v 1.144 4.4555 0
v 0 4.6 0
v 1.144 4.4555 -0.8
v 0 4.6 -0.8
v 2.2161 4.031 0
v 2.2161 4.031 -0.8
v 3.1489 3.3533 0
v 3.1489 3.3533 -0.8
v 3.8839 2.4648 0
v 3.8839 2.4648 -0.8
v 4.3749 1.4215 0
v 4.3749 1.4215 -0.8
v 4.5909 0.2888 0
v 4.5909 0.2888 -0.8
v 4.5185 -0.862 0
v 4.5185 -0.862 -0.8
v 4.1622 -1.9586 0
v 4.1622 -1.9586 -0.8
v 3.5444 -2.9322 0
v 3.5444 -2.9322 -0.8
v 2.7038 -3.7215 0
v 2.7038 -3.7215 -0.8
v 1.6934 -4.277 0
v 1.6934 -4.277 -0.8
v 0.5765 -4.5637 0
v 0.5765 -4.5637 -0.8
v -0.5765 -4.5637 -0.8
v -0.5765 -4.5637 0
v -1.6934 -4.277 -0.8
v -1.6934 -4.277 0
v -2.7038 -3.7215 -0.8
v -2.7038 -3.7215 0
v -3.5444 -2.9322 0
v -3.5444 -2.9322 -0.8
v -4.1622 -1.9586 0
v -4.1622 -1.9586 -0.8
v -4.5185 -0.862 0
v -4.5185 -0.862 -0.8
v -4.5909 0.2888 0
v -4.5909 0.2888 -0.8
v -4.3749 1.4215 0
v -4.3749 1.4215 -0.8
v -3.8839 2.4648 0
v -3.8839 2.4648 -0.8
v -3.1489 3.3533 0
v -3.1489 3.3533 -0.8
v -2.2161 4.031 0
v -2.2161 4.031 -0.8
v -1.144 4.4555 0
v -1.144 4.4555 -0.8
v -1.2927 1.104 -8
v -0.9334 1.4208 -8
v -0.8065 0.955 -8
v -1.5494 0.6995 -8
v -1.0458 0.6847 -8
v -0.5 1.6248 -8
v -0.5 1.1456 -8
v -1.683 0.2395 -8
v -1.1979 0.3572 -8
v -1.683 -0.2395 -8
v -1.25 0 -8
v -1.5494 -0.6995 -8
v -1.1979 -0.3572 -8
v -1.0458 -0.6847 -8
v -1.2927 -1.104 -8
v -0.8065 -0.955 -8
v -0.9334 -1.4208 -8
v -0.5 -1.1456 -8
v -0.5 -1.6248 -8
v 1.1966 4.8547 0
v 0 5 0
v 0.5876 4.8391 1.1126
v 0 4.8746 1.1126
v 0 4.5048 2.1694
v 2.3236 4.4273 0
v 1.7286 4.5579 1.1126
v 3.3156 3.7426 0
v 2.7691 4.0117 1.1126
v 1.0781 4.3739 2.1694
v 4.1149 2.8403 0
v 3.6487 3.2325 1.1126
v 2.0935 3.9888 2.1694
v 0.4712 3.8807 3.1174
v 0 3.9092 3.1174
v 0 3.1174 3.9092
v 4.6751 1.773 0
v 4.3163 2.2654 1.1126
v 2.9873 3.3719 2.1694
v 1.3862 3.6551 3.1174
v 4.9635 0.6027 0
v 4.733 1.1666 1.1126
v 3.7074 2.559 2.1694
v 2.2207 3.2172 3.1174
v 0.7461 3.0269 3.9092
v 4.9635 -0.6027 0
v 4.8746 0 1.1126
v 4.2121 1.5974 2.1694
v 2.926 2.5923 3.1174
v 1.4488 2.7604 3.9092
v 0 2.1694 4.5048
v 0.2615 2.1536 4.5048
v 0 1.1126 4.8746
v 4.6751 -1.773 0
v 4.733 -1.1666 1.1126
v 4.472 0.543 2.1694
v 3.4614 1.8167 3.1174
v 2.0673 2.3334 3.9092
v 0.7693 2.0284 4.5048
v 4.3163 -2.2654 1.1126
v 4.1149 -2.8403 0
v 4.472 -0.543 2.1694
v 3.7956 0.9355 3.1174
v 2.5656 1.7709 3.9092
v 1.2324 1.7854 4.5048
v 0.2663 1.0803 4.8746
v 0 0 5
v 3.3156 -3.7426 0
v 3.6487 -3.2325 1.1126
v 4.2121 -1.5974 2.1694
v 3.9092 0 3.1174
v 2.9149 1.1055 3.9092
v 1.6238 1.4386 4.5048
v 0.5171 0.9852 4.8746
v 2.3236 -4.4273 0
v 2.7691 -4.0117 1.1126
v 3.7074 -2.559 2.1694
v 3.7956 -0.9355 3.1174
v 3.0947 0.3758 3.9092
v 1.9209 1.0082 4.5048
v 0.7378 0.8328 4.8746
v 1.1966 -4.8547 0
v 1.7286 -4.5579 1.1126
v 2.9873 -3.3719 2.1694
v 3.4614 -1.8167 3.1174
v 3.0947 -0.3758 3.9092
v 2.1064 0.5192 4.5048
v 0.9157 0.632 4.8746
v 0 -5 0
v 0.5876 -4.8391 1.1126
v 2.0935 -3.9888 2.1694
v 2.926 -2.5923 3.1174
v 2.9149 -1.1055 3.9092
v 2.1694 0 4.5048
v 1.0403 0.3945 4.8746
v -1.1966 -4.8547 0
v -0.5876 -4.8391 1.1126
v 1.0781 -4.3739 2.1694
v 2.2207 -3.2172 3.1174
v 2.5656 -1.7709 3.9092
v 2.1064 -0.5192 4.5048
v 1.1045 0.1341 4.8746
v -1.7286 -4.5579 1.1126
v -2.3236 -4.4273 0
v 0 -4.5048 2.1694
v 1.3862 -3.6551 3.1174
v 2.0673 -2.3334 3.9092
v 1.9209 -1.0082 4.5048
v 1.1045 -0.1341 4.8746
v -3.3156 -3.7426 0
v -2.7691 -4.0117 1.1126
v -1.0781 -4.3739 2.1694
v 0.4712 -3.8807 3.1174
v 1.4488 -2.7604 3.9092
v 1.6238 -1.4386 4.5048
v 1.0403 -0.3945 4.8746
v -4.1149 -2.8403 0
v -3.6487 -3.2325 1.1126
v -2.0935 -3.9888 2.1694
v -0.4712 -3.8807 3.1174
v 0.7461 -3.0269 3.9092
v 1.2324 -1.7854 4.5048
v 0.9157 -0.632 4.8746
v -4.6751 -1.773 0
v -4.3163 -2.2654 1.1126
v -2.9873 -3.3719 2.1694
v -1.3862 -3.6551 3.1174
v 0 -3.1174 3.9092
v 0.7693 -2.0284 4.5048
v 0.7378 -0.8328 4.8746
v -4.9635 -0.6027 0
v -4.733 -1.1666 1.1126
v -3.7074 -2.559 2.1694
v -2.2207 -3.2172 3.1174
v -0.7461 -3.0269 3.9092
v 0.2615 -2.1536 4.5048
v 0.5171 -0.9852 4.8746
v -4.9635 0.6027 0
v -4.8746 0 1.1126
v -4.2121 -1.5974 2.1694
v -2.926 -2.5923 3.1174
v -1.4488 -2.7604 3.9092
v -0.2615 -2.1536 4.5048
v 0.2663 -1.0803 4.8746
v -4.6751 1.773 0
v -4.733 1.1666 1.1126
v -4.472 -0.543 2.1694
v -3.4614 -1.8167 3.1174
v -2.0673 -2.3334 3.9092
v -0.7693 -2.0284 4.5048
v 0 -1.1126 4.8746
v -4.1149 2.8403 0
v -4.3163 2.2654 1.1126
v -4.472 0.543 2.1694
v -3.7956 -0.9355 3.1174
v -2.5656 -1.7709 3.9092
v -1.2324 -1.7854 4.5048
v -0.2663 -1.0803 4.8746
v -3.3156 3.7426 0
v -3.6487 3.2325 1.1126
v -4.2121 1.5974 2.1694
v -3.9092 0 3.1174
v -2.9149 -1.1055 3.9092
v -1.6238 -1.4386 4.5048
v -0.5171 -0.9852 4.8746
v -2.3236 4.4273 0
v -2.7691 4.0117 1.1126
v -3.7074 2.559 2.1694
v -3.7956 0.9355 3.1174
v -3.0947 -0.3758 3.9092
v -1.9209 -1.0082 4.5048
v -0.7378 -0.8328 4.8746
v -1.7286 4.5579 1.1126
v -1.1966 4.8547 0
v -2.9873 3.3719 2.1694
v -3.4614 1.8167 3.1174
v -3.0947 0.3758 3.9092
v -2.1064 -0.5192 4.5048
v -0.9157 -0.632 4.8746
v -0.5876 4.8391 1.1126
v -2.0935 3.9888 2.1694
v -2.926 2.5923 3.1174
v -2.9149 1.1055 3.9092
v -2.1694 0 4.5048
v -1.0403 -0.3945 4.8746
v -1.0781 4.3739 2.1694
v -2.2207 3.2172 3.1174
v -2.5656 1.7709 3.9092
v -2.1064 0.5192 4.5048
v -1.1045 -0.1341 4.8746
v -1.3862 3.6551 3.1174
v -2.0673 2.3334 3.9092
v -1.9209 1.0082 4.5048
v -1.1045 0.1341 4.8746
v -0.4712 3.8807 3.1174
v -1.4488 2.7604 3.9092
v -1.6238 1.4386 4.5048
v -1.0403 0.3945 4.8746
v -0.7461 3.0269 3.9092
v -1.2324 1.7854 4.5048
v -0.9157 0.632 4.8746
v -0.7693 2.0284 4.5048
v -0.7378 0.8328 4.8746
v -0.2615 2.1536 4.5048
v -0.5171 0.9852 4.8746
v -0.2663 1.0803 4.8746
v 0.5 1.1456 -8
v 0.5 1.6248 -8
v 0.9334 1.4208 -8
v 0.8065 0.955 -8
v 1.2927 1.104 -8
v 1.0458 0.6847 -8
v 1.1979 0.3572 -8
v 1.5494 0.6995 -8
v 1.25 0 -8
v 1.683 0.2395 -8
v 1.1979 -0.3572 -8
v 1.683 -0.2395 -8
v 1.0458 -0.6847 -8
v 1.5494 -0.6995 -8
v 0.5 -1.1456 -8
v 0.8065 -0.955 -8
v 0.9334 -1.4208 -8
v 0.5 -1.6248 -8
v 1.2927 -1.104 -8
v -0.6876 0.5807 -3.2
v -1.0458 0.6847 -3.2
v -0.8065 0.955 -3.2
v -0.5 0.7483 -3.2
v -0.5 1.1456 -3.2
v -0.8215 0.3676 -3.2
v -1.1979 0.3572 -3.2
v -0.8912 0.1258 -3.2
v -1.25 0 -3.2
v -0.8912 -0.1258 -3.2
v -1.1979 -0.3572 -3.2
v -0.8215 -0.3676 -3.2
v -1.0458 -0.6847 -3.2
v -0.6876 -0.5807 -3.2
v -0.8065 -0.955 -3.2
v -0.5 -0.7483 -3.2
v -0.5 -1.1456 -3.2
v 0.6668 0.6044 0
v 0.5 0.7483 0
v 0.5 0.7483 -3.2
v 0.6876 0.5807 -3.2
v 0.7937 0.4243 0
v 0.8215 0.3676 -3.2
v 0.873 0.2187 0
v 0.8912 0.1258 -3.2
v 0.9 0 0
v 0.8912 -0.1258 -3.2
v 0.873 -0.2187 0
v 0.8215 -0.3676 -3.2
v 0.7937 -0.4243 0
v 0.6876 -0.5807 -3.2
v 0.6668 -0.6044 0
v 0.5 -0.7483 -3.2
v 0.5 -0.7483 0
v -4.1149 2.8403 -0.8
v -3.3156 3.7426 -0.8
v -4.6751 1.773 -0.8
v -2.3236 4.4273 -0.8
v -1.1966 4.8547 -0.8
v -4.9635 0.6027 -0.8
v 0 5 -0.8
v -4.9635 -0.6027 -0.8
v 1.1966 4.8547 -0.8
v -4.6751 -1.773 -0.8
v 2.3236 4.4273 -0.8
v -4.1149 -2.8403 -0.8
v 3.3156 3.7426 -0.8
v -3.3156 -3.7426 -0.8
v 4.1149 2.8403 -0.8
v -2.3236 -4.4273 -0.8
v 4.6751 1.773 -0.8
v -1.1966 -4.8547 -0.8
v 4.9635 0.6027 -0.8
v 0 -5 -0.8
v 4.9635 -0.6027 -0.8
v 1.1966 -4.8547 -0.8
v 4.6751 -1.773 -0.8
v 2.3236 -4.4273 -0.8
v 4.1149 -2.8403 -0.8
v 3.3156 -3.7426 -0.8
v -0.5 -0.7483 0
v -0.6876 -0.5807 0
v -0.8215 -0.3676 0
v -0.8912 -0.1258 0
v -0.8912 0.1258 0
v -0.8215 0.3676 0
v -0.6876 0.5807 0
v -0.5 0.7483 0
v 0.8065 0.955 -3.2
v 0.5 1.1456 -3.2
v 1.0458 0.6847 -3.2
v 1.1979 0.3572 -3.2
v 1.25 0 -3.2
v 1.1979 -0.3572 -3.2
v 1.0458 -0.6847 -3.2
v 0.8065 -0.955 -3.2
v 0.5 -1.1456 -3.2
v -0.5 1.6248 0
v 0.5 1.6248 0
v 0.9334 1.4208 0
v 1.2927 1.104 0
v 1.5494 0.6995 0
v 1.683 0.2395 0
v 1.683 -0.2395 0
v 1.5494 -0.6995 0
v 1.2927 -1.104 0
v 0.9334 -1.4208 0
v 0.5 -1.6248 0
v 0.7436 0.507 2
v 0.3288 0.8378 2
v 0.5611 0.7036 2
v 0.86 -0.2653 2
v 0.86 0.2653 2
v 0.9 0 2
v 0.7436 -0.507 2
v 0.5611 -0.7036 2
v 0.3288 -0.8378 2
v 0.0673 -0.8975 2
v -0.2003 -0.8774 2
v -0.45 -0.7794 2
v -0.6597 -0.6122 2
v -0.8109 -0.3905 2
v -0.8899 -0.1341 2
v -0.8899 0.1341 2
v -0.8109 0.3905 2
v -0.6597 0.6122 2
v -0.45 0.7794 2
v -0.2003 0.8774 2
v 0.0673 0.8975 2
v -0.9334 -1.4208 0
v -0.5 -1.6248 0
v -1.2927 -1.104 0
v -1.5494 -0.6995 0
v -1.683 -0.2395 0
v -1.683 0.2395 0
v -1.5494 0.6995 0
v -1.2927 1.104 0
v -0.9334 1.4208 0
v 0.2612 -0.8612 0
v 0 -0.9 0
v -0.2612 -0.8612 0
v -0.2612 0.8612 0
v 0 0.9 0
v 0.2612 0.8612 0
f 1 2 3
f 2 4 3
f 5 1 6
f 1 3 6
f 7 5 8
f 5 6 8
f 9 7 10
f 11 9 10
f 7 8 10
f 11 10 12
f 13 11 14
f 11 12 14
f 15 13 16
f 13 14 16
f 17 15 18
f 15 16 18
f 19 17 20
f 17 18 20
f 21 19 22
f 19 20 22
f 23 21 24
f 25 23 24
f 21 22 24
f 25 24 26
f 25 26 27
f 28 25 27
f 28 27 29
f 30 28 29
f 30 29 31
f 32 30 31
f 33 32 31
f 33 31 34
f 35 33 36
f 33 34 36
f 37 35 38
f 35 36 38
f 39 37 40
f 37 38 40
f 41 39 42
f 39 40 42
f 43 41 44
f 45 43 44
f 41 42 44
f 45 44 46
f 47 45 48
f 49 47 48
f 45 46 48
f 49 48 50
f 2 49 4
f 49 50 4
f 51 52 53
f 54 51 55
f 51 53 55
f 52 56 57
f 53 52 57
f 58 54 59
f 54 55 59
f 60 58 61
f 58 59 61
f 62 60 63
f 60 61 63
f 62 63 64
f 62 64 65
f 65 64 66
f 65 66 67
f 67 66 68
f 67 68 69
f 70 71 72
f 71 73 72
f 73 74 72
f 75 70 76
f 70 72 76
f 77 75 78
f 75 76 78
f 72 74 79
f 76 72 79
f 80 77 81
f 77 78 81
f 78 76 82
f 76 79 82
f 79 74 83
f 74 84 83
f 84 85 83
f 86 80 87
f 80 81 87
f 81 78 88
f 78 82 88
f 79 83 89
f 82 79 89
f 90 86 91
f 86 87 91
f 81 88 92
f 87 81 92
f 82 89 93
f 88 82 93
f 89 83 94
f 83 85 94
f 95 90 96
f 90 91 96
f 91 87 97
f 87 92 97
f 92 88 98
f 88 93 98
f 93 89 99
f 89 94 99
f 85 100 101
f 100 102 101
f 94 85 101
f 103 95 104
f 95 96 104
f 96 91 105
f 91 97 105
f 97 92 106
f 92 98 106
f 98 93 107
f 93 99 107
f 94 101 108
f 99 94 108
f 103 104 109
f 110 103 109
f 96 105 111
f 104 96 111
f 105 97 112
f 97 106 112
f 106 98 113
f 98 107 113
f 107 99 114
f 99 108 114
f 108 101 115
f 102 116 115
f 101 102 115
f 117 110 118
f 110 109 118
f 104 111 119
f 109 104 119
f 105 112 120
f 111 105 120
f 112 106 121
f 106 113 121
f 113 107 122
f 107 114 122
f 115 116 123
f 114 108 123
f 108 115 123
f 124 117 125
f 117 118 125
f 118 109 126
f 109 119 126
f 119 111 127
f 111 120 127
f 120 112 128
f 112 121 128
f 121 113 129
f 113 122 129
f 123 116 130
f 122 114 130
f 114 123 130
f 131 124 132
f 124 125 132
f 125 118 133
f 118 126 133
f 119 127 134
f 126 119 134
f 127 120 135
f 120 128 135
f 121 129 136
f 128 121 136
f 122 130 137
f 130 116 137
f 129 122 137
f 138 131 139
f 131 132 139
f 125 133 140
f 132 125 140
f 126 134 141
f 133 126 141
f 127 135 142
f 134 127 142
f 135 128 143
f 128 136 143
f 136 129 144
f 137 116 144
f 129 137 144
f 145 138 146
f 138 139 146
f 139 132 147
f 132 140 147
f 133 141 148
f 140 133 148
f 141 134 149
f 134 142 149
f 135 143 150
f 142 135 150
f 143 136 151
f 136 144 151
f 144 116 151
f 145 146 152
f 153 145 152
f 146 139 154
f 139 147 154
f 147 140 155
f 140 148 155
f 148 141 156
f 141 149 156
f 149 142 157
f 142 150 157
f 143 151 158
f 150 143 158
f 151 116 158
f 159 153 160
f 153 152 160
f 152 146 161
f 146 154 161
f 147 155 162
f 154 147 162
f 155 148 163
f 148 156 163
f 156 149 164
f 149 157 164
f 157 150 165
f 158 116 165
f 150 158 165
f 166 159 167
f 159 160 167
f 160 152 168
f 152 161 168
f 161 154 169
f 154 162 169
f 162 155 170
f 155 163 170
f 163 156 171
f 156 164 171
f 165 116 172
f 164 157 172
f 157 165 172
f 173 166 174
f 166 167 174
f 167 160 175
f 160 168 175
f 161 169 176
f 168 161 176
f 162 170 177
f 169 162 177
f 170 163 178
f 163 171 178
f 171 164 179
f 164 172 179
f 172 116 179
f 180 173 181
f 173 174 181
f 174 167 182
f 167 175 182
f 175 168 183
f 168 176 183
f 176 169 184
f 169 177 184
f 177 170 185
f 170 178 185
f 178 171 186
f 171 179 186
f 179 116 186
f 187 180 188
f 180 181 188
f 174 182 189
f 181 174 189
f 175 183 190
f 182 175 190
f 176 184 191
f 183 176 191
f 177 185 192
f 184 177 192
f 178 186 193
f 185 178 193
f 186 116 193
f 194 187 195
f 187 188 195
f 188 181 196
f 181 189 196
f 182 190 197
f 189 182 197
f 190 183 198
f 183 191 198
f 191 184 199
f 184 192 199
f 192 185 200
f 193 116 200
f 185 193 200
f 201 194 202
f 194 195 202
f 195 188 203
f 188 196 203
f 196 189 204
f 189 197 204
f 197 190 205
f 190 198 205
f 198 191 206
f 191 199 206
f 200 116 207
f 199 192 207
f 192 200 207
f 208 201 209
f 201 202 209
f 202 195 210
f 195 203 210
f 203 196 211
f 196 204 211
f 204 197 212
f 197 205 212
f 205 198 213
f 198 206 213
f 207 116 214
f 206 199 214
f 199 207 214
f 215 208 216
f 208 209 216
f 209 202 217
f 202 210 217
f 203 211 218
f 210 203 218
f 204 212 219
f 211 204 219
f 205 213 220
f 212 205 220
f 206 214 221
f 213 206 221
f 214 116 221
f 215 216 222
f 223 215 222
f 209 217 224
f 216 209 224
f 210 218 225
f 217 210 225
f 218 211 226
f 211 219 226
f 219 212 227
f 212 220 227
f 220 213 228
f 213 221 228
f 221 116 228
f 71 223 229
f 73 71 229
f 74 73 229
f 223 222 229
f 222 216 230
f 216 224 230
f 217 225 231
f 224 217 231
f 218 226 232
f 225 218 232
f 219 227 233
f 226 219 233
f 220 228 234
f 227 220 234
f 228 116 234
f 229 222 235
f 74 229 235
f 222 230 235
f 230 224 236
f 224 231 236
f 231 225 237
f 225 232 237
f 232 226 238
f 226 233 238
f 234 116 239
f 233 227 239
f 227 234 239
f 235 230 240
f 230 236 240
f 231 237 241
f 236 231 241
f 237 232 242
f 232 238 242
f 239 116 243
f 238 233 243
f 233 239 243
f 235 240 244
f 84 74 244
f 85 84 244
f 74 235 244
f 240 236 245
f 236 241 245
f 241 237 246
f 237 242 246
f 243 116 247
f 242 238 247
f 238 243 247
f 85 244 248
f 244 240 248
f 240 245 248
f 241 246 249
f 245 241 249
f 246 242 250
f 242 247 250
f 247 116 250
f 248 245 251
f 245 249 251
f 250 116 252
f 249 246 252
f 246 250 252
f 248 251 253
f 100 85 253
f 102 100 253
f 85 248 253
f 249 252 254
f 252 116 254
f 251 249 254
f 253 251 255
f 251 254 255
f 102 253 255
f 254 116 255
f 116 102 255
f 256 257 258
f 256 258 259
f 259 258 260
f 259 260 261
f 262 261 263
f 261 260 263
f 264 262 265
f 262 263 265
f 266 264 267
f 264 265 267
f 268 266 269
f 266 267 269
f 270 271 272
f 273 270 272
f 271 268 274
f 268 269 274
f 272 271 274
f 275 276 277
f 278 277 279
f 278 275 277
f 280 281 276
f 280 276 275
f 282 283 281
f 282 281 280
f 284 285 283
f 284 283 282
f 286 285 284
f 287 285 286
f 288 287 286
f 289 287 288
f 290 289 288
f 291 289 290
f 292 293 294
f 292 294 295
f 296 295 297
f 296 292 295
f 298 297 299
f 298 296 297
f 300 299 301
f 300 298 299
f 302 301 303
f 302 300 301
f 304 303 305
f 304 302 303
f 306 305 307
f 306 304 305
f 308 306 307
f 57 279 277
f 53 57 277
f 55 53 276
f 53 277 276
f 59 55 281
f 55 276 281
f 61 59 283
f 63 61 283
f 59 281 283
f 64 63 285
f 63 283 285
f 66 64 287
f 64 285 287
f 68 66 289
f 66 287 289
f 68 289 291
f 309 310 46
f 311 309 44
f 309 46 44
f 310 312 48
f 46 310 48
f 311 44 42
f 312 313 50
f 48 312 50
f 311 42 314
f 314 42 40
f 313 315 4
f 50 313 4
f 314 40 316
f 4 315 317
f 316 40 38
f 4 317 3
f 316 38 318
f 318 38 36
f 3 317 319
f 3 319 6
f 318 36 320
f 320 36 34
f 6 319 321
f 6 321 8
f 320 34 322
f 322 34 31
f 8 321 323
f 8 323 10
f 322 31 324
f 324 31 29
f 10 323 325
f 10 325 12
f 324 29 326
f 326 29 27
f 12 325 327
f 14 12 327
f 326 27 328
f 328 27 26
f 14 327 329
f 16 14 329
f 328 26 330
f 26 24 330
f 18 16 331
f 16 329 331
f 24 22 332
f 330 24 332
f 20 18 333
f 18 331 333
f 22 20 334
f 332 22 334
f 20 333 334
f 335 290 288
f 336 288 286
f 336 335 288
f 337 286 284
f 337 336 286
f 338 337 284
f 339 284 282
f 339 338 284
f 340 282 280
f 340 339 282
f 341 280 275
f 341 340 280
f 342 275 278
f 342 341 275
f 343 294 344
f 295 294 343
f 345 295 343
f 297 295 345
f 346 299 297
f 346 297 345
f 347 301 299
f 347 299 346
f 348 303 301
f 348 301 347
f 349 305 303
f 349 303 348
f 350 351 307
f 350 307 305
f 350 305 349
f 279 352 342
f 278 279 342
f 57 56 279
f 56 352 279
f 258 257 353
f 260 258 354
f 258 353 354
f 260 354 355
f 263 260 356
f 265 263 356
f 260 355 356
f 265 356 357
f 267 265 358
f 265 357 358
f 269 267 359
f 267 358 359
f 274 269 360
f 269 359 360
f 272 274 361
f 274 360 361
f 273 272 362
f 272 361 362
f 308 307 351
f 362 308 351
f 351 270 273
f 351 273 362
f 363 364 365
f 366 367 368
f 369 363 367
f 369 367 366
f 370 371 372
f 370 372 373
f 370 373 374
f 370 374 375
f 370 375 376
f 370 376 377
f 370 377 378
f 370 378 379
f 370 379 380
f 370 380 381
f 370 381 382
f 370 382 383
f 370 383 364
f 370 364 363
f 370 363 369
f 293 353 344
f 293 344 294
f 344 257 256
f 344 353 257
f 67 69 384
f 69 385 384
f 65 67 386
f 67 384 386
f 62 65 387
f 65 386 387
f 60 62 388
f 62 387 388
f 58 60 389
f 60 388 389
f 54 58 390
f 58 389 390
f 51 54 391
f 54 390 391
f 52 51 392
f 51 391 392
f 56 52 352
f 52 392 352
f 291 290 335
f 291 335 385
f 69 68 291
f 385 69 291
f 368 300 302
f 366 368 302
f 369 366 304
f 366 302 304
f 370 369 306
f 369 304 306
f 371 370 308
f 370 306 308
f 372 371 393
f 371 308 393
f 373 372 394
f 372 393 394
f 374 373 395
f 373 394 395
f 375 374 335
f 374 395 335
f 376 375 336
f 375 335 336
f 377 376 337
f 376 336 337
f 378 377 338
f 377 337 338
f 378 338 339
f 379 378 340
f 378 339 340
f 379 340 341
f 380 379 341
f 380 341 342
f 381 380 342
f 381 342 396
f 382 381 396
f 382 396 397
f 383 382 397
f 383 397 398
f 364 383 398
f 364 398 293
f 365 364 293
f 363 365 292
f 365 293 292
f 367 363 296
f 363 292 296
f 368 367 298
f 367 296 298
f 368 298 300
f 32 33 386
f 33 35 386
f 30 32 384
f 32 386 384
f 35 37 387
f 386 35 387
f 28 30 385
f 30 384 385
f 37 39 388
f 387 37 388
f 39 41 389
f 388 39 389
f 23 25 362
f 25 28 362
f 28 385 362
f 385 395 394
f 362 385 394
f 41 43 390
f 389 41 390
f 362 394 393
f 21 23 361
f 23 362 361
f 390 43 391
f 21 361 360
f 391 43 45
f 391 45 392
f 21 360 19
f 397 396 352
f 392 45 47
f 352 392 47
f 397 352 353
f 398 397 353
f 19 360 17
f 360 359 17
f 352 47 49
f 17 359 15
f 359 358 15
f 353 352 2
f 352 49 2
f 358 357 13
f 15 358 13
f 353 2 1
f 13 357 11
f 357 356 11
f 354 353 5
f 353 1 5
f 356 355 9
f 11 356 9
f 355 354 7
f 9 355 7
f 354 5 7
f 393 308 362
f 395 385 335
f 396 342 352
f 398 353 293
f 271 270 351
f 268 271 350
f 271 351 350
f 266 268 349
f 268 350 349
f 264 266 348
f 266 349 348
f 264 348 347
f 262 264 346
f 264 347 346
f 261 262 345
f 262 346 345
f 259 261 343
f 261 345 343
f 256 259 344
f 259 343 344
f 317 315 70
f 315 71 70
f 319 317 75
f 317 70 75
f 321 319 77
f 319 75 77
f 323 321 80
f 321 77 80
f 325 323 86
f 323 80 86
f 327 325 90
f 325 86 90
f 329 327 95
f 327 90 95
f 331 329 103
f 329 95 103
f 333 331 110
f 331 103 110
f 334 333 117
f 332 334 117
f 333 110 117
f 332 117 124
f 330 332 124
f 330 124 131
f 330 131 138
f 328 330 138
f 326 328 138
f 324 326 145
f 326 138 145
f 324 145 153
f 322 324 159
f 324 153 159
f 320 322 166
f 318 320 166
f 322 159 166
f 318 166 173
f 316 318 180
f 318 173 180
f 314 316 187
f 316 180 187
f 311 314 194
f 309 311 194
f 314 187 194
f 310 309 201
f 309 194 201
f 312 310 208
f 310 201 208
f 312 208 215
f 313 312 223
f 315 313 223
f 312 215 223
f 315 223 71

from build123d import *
from build123d import SkipClean  # not in build123d's __all__

# Parameters (mm, degrees)
F2_R      = 1.25
F3_DEPTH  = 8.001
F5_R      = 1.25
F5_R_2    = 0.9
F6_DEPTH  = 3.2
F7_W      = 1
F7_H      = 4
F8_DEPTH  = 8
F9_R      = 0.9
F10_DEPTH = 2


with BuildPart() as f1:
    # F0 (on Right) → F1 (revolve)
    with BuildSketch(Plane.YZ):
        with BuildLine():
            Line((5, -0.8), (5, 0))
            ThreePointArc((5, 0), (3.5355339059, 3.5355339059), (0, 5))
            Line((0, 5), (0, -8))
            Line((0, -8), (1.7, -8))
            Line((1.7, -8), (1.7, 0))
            Line((1.7, 0), (4.6, 0))
            Line((4.6, 0), (4.6, -0.8))
            Line((4.6, -0.8), (5, -0.8))
        make_face()
    revolve(axis=Axis((0, 0, -1.5), (0, 0, -1)))

    # F2 (on Top) → F3 (cut, through all)
    with BuildSketch(Plane.XY):
        Circle(F2_R)
    extrude(amount=-F3_DEPTH, mode=Mode.SUBTRACT)

    # F5 (on face) → F6 (join)
    with BuildSketch(Plane(origin=(0, 0, 0), x_dir=(1, 0, 0), z_dir=(0, 0, -1))):
        Circle(F5_R)
        Circle(F5_R_2, mode=Mode.SUBTRACT)
    extrude(amount=F6_DEPTH)

    # F7 (on face) → F8 (cut, through all)
    with BuildSketch(Plane(origin=(0, 0, -8), x_dir=(1, 0, 0), z_dir=(0, 0, -1))):
        Rectangle(F7_W, F7_H)
    extrude(amount=-F8_DEPTH, mode=Mode.SUBTRACT)

    # F9 (on face) → F10 (cut)
    with BuildSketch(Plane(origin=(0, 0, 0), x_dir=(1, 0, 0), z_dir=(0, 0, -1))):
        Circle(F9_R)
    with SkipClean():  # cleaning this boolean's faces spoils the solid; the shape is the same uncleaned
        extrude(amount=-F10_DEPTH, mode=Mode.SUBTRACT)


solid = f1.part
